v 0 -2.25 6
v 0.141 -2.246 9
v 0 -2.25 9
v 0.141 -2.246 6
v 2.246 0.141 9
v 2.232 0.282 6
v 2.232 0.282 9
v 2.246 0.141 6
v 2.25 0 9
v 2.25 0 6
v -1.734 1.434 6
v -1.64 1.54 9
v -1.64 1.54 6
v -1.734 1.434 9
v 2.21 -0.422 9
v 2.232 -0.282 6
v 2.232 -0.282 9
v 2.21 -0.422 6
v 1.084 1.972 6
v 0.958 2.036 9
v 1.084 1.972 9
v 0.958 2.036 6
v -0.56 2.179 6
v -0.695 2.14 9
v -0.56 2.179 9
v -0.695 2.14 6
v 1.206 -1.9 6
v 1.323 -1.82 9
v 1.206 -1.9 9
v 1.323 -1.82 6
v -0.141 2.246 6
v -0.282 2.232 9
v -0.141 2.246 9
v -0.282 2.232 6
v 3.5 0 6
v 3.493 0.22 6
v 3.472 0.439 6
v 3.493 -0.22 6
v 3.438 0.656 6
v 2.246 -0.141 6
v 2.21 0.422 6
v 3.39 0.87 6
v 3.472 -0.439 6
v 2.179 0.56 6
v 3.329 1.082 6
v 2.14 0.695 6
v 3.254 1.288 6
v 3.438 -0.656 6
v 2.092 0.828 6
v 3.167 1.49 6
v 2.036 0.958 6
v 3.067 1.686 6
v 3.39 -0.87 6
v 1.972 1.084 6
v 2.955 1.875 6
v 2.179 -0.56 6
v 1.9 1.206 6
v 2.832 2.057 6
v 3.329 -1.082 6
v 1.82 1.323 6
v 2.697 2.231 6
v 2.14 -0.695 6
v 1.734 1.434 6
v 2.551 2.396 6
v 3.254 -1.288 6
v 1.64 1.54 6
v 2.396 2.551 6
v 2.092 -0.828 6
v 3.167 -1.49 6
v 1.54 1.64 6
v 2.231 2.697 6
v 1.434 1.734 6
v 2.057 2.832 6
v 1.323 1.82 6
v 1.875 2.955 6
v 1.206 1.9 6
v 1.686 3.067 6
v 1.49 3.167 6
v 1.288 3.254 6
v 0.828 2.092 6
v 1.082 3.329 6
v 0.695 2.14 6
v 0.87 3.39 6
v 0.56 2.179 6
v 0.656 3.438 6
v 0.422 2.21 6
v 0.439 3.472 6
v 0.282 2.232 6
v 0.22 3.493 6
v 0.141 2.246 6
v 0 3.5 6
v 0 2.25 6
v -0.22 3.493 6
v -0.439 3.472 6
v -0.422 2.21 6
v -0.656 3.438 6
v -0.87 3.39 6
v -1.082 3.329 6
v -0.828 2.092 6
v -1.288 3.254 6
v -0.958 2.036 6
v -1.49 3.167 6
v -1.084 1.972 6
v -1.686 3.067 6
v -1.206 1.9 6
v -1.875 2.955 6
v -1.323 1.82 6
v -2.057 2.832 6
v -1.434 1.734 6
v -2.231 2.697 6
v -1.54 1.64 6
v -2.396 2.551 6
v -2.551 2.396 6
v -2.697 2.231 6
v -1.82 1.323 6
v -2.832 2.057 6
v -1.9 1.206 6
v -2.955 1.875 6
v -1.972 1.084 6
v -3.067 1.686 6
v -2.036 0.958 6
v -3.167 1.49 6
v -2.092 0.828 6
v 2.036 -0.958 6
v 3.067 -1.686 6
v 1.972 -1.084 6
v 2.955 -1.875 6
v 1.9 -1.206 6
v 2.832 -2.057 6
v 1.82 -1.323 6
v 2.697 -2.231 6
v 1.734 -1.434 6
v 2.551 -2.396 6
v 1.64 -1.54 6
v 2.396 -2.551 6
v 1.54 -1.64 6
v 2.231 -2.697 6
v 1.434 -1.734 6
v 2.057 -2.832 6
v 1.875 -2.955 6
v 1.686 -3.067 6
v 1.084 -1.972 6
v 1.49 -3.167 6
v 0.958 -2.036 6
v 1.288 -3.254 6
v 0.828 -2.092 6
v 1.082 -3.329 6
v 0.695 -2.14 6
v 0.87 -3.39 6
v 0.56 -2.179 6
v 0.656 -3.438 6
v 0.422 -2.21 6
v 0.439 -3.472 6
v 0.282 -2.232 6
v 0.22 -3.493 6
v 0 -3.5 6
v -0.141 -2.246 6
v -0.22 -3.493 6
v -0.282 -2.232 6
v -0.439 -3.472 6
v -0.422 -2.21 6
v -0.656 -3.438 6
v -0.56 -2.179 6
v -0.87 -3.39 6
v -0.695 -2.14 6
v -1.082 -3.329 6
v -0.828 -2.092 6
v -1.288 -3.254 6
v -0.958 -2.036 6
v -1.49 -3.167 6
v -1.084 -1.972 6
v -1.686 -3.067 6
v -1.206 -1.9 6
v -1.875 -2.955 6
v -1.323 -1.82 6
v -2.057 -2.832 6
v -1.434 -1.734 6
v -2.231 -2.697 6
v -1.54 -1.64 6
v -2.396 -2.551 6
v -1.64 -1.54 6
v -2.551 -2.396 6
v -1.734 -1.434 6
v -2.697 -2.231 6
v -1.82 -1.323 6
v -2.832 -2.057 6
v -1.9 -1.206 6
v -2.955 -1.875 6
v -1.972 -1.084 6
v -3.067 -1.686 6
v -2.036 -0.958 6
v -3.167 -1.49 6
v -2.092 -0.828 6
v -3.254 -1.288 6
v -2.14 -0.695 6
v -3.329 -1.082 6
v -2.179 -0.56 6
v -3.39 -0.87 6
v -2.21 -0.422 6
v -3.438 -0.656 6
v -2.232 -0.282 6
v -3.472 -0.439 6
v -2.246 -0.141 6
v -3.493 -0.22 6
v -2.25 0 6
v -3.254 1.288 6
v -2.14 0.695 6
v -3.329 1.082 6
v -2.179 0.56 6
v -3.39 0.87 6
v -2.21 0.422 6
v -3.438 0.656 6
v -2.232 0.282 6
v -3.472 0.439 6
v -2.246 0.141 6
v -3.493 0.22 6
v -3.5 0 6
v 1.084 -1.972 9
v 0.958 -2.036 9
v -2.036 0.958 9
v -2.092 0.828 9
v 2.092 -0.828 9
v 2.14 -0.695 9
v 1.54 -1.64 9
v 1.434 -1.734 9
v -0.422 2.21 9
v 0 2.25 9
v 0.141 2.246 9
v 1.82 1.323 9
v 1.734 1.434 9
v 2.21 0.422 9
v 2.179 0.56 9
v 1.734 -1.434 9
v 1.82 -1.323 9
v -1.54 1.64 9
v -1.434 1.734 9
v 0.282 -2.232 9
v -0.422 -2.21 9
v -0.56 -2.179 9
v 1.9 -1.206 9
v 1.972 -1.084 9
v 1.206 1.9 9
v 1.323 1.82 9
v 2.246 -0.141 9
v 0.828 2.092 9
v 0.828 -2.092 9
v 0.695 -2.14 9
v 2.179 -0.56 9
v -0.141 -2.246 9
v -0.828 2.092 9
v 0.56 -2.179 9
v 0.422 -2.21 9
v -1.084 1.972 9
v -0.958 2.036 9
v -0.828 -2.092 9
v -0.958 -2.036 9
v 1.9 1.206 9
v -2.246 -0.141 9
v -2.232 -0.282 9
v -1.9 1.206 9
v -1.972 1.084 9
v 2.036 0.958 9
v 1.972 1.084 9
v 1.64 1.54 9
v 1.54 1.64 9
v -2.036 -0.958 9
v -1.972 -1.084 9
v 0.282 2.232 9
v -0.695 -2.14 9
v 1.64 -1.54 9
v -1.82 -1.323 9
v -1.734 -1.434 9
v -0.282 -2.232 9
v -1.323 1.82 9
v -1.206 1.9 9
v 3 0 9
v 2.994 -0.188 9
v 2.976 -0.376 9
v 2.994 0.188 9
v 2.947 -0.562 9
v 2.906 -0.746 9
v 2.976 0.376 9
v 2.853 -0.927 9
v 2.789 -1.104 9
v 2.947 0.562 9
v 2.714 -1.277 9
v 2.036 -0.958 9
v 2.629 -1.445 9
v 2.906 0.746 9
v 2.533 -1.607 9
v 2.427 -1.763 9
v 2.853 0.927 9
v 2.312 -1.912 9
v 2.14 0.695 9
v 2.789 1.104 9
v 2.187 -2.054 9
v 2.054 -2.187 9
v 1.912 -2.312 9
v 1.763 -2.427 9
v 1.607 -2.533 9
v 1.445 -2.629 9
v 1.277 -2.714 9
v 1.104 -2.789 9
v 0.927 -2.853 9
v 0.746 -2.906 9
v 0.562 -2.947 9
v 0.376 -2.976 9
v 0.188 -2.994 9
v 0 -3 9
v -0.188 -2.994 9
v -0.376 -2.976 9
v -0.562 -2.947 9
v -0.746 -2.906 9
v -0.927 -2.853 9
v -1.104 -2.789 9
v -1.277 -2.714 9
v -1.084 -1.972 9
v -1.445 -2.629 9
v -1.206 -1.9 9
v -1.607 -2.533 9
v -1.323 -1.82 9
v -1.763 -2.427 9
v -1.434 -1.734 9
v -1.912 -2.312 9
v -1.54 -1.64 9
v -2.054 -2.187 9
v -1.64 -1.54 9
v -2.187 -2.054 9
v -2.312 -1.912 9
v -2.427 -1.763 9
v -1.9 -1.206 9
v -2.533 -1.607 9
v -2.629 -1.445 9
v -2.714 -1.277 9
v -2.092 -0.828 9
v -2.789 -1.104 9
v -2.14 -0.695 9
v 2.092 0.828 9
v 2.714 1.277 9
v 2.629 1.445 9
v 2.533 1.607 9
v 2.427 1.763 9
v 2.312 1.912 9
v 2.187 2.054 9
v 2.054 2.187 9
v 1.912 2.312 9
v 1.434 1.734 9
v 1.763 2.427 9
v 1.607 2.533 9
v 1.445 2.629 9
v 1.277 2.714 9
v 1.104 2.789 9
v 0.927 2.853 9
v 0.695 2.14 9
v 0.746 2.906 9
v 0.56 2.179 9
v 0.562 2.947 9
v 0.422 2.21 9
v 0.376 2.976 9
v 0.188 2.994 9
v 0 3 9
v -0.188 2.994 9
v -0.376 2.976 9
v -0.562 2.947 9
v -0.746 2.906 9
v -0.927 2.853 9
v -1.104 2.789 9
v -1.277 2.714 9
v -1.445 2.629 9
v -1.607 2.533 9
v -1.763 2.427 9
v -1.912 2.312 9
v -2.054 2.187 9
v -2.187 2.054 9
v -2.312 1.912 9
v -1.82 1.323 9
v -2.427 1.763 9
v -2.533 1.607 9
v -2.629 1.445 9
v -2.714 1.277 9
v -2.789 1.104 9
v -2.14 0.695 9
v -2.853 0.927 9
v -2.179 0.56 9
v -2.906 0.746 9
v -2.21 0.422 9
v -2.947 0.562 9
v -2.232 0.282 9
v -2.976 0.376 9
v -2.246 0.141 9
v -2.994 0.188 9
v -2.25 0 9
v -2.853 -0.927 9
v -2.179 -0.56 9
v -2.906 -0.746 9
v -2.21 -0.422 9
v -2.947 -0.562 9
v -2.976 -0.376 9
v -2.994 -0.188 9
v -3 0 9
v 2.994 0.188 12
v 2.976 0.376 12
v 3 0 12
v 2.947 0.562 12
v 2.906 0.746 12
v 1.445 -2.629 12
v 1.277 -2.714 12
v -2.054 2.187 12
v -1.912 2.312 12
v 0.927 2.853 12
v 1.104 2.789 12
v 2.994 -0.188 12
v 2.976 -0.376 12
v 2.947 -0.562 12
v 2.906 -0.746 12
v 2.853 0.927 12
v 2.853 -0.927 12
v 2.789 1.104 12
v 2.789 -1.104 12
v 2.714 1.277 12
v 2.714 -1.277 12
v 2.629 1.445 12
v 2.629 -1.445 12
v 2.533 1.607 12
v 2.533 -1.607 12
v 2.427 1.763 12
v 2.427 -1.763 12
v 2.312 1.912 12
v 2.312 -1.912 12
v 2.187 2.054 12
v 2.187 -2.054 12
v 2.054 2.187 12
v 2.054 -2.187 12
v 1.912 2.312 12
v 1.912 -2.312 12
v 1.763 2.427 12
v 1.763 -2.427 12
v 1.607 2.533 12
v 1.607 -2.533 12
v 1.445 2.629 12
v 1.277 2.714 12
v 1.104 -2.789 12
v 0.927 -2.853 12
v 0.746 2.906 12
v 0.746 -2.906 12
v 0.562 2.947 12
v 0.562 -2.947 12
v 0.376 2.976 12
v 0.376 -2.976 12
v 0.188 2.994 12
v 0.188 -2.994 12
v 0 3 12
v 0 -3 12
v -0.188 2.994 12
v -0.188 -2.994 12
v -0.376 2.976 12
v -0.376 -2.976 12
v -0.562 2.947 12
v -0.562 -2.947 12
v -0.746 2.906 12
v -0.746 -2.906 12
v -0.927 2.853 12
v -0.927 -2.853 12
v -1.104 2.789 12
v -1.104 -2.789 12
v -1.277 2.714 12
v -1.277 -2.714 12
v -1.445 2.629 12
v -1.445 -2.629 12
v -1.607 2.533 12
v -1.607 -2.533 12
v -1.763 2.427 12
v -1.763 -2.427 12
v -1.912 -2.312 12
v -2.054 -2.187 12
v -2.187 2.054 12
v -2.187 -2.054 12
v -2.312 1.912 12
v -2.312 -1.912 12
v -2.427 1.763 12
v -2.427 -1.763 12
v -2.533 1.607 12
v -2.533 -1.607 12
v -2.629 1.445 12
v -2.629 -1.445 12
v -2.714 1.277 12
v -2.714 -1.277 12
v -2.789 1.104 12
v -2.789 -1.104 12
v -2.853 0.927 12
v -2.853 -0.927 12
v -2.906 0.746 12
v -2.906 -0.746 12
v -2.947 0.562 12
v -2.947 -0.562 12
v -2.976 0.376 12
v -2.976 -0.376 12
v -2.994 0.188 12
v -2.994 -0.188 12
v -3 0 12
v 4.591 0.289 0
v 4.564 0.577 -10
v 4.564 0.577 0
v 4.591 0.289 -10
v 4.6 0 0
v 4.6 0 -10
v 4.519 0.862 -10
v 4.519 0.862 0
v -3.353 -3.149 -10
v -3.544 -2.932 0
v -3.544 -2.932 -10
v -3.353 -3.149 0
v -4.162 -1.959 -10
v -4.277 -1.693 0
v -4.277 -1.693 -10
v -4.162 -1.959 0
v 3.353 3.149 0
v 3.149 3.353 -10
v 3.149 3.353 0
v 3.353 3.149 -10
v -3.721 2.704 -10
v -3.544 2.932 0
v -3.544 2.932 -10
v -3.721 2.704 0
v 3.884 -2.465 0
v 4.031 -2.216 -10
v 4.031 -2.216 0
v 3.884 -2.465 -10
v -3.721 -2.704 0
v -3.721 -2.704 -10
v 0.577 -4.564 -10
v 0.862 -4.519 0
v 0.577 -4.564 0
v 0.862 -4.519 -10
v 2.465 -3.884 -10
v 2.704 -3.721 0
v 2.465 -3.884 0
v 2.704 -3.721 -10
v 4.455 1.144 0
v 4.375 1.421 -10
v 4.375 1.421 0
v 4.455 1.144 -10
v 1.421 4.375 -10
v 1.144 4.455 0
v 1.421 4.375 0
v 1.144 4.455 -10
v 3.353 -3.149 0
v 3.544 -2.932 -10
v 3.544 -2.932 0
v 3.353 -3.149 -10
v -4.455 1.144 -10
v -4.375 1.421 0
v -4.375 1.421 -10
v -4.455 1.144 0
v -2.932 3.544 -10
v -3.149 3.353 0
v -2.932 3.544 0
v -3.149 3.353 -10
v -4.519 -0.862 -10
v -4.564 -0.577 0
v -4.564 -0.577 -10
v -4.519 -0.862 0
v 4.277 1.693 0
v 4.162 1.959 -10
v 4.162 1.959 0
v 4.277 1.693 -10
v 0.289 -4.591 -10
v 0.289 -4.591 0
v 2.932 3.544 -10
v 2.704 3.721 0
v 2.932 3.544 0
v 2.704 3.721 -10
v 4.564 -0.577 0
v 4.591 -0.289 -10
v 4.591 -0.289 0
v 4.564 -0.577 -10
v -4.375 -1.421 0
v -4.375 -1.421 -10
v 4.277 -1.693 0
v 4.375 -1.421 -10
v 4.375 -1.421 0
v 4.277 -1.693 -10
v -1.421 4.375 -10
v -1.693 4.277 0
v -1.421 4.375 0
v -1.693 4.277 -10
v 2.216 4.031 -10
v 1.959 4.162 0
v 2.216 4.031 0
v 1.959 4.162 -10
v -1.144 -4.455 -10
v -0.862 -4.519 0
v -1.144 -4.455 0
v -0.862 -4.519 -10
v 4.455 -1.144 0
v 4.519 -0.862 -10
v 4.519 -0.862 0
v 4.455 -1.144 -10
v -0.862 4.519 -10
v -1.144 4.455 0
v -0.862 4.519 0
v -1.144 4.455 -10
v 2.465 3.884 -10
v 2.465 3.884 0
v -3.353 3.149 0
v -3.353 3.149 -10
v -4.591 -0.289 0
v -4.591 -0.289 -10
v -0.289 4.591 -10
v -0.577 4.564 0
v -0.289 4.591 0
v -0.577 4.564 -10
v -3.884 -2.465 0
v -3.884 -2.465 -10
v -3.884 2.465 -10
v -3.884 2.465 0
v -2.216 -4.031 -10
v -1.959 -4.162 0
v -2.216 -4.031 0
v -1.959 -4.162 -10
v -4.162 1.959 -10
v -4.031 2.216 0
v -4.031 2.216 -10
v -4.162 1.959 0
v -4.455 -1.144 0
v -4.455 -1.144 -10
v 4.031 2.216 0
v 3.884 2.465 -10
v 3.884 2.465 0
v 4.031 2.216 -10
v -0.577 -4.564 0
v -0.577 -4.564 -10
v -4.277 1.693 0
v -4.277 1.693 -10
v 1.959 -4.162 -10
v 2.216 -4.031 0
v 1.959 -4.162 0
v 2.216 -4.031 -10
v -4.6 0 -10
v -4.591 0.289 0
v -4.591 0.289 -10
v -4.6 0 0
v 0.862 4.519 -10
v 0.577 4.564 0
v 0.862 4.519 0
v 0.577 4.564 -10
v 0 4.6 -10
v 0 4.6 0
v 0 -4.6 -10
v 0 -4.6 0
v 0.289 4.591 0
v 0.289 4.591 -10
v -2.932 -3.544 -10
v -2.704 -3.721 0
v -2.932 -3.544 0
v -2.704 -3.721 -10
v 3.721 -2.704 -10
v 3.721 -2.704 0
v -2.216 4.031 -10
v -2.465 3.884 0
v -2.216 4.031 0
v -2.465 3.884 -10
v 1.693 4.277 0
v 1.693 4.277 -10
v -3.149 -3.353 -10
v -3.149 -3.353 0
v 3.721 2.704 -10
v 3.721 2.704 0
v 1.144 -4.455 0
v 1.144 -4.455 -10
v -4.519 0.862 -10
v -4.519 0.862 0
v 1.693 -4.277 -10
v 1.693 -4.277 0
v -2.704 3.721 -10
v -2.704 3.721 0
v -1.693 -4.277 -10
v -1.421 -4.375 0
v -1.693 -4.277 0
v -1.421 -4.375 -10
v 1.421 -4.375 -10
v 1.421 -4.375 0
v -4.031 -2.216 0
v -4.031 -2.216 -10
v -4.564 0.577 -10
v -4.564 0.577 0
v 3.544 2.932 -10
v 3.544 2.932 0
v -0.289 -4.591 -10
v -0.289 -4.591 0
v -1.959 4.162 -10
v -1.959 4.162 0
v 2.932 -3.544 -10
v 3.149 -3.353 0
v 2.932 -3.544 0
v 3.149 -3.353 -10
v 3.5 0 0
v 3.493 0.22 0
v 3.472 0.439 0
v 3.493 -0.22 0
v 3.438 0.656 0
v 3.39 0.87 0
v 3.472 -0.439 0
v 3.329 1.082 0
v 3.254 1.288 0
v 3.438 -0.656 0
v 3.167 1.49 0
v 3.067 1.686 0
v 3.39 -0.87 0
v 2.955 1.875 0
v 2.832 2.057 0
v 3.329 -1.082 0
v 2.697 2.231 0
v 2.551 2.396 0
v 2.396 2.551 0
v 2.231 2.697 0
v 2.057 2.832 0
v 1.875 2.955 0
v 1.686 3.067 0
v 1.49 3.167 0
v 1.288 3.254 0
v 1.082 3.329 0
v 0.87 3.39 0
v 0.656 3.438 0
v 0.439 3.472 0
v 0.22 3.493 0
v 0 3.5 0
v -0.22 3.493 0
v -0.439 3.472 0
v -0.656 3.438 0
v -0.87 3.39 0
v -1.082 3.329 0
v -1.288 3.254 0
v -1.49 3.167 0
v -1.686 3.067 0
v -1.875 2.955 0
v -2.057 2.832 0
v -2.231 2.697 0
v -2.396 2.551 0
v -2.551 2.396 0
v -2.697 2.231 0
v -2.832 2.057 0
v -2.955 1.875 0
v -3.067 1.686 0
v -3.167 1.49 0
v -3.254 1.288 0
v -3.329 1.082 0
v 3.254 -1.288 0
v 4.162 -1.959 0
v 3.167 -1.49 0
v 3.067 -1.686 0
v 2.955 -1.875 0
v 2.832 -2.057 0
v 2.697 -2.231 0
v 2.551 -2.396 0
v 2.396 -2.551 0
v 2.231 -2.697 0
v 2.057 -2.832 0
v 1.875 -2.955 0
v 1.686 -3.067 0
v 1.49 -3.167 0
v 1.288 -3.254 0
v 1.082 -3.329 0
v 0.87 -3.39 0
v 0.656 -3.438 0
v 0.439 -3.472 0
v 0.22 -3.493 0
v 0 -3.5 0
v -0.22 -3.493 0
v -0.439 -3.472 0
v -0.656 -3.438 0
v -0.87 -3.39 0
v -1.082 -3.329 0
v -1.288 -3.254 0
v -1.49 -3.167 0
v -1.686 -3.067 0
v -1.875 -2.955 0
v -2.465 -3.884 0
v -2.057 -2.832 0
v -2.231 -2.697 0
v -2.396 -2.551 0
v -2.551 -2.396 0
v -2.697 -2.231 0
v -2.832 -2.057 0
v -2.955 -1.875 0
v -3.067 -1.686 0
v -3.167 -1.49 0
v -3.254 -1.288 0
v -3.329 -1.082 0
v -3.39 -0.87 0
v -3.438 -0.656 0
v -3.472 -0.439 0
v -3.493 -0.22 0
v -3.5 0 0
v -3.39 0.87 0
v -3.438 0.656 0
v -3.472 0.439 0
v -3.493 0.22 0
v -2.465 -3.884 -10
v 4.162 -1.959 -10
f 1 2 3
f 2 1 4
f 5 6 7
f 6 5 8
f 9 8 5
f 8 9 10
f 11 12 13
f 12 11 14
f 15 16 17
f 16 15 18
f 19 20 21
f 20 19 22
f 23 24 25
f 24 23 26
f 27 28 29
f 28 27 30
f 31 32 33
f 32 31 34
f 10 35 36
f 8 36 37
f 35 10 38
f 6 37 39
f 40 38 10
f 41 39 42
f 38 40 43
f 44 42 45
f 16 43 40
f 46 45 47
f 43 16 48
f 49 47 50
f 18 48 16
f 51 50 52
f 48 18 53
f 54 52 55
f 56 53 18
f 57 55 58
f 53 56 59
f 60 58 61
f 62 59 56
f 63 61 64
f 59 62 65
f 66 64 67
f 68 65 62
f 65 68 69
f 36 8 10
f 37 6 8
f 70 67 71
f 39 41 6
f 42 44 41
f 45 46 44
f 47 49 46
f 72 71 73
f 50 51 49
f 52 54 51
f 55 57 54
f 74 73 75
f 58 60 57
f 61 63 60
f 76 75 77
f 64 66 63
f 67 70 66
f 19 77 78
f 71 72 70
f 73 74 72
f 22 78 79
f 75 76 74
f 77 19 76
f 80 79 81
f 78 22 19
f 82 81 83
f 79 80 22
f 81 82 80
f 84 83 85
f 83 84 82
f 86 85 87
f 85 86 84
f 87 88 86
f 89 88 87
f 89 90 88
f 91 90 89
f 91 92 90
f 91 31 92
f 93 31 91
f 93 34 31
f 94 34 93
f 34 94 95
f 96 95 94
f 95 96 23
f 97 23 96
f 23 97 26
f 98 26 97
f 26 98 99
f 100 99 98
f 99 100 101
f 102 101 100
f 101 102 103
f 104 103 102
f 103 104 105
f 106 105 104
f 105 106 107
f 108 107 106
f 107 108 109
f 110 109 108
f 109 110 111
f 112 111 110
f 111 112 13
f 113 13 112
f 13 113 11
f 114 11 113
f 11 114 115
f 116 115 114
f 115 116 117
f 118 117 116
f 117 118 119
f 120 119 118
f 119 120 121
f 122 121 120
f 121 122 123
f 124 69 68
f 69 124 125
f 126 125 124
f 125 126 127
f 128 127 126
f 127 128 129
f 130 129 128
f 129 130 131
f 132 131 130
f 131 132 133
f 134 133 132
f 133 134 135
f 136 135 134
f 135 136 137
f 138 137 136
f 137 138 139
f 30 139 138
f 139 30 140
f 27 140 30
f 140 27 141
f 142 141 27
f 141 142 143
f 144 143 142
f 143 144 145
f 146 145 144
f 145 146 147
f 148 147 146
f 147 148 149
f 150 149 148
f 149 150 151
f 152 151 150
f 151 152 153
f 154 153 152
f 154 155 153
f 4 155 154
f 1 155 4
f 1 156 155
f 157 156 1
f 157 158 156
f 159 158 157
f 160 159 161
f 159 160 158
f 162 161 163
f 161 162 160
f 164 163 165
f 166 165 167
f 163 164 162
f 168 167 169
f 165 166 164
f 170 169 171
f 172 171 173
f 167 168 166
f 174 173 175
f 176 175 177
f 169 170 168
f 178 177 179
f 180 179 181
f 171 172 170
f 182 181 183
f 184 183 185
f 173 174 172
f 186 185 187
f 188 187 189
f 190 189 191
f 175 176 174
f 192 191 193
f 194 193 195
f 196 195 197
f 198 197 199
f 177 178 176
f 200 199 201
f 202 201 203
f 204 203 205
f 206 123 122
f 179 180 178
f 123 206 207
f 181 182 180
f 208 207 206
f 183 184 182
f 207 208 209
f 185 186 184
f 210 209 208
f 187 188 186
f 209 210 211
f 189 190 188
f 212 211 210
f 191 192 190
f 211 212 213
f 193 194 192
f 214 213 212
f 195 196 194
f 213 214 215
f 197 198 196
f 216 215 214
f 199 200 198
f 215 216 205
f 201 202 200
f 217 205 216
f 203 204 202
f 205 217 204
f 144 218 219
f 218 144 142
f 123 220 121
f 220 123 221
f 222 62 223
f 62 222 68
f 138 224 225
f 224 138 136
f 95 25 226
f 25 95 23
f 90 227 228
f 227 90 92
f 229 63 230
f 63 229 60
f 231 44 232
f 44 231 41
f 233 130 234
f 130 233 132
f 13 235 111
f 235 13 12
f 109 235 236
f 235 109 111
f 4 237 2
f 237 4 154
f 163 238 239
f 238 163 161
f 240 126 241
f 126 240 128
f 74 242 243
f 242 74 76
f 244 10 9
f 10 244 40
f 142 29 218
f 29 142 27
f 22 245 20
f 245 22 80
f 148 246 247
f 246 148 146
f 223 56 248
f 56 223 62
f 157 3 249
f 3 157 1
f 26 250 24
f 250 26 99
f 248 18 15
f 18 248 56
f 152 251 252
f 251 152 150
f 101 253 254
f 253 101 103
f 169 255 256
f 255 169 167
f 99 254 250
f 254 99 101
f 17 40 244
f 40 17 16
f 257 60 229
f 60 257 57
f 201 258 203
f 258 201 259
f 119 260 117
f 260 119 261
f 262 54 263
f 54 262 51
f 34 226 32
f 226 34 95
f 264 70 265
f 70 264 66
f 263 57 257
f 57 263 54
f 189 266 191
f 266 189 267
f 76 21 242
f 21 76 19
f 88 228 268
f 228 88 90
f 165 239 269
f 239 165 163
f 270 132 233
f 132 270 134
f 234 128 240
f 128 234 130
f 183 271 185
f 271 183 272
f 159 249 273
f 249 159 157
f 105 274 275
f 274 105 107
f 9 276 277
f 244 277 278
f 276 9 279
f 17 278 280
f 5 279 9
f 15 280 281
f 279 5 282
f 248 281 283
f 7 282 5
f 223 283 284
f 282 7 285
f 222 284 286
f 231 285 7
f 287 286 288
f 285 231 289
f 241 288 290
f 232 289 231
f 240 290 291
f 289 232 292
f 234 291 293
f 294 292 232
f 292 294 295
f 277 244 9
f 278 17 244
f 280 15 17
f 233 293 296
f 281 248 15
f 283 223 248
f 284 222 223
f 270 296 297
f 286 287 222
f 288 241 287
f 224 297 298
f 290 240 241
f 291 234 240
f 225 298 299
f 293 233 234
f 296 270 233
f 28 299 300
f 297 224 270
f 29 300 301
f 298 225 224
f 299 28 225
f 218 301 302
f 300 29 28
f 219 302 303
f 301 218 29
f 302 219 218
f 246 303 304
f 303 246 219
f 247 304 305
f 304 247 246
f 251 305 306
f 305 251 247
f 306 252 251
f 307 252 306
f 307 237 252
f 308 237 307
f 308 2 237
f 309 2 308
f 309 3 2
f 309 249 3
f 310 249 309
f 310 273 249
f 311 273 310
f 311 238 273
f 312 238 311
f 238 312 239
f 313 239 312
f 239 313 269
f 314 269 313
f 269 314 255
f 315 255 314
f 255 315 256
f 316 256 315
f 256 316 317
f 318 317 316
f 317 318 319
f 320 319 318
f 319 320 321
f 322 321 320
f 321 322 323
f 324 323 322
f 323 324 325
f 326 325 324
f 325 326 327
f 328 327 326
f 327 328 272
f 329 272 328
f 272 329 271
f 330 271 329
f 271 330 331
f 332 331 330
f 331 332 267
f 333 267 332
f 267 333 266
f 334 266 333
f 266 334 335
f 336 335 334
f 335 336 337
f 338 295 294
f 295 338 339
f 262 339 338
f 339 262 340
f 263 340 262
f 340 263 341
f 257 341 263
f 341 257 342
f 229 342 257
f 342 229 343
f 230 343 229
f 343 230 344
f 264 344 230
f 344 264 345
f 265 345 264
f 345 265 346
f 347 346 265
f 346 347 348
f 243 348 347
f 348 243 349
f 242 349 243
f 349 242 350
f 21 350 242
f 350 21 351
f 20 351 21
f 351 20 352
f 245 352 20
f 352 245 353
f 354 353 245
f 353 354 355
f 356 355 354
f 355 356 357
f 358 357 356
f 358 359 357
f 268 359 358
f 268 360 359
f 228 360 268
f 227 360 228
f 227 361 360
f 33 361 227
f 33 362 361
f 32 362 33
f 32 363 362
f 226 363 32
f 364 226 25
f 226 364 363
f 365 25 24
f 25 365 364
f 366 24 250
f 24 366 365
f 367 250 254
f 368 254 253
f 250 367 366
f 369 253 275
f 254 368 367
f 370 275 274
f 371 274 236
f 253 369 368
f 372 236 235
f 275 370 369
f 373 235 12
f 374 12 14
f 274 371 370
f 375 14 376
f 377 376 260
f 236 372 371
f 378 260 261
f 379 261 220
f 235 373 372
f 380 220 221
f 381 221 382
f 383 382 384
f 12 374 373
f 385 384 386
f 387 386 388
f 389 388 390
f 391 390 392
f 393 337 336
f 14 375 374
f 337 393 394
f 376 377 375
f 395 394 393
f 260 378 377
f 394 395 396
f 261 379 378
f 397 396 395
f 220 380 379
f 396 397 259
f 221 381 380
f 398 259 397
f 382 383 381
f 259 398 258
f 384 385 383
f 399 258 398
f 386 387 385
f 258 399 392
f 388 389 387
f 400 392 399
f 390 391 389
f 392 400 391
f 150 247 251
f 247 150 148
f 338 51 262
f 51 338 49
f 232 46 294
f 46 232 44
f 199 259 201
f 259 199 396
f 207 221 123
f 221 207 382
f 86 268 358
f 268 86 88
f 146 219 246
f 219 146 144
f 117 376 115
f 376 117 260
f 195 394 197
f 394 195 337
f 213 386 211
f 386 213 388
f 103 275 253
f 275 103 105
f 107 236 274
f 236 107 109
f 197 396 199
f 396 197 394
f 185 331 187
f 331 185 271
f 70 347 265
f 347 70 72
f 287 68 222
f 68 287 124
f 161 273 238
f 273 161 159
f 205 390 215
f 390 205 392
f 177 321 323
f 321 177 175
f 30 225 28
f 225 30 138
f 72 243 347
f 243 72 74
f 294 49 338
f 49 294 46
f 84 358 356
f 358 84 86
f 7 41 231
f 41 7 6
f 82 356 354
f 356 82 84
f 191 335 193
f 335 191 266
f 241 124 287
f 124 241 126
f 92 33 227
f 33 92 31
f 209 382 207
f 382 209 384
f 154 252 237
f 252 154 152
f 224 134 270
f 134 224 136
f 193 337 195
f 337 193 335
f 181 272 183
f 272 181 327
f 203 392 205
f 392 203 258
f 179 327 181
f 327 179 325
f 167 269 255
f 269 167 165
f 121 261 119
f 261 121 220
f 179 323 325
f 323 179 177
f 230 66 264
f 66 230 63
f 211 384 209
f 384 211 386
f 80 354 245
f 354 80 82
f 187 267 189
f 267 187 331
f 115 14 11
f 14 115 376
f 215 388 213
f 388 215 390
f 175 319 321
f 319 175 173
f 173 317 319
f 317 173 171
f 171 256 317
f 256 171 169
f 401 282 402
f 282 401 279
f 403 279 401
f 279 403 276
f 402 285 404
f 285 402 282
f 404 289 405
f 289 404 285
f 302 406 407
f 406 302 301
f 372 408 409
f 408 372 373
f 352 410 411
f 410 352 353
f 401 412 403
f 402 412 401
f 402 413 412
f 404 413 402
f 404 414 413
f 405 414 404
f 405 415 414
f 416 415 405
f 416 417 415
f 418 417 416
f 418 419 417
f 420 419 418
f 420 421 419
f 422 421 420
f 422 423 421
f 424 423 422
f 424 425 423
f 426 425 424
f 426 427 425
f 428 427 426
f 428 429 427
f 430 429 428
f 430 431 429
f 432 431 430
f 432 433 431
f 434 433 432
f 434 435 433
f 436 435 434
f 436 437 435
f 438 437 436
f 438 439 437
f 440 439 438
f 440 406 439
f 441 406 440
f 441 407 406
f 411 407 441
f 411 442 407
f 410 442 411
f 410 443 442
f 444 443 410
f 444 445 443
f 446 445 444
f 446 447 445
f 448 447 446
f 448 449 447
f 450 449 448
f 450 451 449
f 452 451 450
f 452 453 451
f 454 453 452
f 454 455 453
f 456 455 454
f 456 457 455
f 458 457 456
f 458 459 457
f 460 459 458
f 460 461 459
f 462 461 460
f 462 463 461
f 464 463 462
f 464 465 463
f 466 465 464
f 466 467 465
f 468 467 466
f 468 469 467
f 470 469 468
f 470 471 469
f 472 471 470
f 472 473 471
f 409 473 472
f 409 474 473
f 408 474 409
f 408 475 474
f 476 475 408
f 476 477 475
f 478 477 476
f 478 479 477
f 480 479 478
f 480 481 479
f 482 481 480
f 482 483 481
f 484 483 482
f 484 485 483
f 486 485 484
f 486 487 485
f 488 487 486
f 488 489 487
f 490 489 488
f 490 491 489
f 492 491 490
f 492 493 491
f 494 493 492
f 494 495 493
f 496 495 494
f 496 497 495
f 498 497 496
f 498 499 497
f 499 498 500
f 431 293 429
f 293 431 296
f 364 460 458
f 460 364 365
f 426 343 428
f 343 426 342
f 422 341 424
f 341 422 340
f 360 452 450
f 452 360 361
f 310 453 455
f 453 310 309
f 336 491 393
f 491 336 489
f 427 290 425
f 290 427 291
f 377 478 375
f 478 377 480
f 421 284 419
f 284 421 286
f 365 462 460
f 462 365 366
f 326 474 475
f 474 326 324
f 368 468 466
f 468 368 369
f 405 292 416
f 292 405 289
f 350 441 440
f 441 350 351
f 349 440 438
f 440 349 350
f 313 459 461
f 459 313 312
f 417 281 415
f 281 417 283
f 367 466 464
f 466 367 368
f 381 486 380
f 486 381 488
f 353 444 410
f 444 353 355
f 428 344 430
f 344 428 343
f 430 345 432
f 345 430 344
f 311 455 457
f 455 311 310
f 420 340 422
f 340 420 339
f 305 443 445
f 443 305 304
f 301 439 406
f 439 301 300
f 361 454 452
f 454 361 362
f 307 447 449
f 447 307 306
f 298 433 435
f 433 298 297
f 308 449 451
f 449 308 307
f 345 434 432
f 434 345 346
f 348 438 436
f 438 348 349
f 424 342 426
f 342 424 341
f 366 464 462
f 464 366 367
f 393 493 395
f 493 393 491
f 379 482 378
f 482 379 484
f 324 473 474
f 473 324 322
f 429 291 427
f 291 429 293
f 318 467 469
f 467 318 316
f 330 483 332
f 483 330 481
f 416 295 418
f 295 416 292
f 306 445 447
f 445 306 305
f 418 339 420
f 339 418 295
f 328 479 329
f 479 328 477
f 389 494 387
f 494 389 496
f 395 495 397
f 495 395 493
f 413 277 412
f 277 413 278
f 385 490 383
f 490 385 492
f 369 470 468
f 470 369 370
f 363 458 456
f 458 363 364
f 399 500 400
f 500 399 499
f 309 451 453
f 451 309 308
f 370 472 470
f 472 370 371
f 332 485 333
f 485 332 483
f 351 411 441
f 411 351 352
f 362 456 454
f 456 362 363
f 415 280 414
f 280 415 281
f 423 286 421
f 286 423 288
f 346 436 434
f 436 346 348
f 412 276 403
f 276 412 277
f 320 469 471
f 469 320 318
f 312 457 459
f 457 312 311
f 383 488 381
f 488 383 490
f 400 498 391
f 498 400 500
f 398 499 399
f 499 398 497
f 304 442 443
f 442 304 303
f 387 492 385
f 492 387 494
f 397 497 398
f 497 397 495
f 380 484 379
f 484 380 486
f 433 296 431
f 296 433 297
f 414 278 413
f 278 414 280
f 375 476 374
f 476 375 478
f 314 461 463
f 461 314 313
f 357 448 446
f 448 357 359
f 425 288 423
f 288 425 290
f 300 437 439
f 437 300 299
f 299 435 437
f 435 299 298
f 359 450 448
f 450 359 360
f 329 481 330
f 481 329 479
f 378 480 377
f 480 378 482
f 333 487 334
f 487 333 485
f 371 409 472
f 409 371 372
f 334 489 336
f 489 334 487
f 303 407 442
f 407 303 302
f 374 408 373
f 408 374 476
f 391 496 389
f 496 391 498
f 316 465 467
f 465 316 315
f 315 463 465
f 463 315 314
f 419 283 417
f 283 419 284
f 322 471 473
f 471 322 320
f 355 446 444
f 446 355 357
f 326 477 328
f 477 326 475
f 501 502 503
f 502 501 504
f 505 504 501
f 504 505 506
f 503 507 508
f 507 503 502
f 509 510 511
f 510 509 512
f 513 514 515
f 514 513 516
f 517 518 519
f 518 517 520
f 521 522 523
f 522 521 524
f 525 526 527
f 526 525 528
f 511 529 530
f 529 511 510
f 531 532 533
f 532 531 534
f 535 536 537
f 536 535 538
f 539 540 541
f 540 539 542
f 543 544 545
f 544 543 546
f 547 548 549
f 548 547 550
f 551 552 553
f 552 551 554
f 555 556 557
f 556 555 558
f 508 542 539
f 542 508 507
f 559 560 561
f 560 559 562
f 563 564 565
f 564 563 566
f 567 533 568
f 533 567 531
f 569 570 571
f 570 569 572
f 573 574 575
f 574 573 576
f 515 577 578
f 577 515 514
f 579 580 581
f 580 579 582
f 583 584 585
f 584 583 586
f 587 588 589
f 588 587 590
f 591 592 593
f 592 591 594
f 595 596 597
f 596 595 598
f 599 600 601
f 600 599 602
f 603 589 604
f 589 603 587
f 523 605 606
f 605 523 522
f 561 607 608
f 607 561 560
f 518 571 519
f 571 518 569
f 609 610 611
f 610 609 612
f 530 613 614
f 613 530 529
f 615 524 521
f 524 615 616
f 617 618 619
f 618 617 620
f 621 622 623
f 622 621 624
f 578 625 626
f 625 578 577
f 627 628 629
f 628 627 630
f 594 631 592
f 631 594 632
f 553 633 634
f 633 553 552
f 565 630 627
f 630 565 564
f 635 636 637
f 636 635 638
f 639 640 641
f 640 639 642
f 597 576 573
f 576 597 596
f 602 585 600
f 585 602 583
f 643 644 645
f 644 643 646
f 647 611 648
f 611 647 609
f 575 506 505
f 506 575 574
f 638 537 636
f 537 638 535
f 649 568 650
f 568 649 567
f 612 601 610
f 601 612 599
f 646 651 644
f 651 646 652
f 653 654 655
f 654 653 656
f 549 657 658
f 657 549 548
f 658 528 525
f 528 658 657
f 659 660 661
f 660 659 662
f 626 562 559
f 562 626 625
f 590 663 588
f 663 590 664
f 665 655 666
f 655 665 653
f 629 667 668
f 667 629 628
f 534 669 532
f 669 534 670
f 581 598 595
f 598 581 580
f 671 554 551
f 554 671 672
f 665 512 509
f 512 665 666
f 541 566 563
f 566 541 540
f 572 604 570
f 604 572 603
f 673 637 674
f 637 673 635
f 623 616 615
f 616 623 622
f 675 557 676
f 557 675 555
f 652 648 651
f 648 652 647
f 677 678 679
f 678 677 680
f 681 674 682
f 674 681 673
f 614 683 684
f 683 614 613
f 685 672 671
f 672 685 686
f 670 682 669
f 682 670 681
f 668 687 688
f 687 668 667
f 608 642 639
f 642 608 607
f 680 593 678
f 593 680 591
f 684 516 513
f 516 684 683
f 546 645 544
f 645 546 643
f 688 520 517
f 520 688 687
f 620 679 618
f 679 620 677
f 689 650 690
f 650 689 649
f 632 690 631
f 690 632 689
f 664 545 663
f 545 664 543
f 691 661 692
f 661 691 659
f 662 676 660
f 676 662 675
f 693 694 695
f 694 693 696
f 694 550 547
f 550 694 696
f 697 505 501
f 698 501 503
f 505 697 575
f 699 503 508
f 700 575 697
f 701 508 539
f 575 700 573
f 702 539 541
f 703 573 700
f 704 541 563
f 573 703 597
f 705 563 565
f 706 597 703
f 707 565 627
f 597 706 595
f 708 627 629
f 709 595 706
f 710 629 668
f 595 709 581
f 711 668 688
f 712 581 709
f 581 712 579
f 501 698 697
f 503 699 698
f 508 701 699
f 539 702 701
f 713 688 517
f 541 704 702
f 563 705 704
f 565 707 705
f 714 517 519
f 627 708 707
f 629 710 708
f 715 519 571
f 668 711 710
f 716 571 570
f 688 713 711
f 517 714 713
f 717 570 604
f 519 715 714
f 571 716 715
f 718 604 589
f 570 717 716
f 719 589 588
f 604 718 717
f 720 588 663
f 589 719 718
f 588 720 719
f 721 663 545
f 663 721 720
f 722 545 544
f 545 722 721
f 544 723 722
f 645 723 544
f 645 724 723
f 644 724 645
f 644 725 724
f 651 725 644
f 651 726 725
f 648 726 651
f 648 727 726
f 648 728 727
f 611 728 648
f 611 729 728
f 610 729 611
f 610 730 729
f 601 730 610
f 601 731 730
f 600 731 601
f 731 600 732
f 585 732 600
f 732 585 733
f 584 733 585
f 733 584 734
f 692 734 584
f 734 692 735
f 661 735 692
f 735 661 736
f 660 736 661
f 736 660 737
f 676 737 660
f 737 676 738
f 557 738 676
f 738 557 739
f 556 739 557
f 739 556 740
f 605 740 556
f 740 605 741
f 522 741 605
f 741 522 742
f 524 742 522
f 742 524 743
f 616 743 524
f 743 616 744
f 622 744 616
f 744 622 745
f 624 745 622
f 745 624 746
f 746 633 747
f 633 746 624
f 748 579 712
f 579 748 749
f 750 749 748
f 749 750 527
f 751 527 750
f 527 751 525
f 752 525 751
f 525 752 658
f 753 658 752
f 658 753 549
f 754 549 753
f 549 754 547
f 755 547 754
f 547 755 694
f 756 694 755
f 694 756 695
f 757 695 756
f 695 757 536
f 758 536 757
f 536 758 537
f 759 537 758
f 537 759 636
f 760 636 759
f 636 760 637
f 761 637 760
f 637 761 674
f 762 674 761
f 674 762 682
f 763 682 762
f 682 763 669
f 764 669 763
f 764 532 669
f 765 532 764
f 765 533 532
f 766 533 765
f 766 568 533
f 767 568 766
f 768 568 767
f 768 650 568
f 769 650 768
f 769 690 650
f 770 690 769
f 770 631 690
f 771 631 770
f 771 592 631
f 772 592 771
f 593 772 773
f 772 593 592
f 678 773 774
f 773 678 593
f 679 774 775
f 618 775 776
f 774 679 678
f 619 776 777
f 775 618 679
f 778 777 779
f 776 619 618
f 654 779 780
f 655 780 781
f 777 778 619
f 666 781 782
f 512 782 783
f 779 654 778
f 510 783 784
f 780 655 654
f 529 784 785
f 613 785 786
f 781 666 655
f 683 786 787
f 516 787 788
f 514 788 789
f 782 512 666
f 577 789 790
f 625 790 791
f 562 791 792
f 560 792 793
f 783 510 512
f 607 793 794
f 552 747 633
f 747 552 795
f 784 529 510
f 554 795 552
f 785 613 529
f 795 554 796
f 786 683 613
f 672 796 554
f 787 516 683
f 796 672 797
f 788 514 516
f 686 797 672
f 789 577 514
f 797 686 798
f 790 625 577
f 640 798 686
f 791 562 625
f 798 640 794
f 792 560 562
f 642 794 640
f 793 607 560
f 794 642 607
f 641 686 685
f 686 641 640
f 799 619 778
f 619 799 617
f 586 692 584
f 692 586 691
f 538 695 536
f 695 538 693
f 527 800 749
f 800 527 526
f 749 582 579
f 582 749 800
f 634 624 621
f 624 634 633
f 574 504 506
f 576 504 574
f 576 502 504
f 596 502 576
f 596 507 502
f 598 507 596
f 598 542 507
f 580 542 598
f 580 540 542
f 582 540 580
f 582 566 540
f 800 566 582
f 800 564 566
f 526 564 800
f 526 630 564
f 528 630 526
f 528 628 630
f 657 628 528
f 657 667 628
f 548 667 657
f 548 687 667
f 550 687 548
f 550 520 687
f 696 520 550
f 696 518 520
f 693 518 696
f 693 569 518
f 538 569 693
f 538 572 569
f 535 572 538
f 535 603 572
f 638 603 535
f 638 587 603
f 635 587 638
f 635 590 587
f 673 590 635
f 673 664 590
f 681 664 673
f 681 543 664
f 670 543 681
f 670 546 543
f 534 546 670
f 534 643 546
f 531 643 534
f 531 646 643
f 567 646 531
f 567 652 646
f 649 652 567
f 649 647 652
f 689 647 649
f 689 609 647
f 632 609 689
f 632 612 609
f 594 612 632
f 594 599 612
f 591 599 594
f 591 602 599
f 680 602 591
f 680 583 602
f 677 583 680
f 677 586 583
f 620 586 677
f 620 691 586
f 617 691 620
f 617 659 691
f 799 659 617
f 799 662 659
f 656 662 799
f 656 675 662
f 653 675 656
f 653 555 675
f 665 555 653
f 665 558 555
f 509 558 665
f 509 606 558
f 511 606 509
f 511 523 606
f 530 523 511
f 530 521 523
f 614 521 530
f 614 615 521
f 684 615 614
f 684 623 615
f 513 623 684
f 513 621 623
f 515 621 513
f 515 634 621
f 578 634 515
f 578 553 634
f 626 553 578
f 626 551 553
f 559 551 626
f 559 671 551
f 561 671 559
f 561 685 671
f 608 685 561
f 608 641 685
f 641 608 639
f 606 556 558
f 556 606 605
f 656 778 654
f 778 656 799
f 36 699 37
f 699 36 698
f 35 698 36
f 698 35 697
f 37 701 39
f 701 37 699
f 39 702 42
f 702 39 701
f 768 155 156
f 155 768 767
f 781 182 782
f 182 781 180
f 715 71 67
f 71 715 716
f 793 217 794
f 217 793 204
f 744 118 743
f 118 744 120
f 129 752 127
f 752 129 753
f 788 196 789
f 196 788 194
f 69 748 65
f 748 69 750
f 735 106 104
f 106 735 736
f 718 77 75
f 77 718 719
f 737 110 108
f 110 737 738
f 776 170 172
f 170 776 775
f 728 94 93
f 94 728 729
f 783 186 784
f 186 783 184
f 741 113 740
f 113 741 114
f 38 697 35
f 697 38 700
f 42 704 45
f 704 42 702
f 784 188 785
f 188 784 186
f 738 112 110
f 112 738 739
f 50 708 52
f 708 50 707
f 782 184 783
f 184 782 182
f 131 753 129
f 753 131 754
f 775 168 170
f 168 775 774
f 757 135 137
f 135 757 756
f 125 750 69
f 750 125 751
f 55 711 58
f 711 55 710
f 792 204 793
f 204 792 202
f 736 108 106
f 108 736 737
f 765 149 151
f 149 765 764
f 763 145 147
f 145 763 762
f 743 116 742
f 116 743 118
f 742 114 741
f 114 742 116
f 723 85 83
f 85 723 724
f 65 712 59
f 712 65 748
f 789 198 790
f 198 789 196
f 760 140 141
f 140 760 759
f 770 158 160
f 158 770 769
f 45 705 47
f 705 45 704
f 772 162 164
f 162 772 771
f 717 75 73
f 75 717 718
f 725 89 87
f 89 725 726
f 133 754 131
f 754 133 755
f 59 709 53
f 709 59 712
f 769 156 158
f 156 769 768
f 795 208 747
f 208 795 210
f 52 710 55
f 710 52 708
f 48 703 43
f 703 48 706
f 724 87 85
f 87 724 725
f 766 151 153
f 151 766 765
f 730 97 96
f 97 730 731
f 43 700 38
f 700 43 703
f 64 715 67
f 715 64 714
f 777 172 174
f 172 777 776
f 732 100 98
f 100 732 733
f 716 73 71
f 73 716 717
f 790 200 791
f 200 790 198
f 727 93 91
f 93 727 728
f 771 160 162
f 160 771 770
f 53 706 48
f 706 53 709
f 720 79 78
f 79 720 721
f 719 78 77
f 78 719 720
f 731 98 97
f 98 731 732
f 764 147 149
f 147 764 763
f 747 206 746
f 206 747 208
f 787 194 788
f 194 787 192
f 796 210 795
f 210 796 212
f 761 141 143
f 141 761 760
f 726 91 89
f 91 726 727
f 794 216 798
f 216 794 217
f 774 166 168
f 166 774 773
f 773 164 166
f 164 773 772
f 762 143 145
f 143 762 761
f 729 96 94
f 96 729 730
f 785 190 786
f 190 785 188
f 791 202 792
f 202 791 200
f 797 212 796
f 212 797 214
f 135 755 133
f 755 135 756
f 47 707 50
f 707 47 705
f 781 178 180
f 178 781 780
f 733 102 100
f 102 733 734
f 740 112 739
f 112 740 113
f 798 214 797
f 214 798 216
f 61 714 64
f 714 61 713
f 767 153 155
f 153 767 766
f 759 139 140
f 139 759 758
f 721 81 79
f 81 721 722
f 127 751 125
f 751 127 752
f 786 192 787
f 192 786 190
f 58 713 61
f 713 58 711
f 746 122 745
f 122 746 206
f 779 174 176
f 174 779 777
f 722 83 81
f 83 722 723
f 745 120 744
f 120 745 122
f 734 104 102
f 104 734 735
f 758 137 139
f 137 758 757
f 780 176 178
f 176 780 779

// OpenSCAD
// file: ../push-switches.scad
ps10_mounting_thread_d = 7;
ps10_mounting_thread_h = 6;
ps10_raster = 4.3;
ps10_corpus_d = 9.2;
ps10_corpus_h = 10;

ps10_button_leg_h = 3;
ps10_button_leg_d = 4.5; // GUESTIMATE
ps10_button_h = 3;
ps10_button_d = 6;

module ps10_push_switch() {
  translate([0, 0, -ps10_corpus_h])
    cylinder(d = ps10_corpus_d, h = ps10_corpus_h);

  cylinder(d = ps10_mounting_thread_d, h = ps10_mounting_thread_h);

  translate([0, 0, ps10_mounting_thread_h]) {
    cylinder(d = ps10_button_leg_d, h = ps10_button_leg_h);

    translate([0, 0, ps10_button_leg_h])
      cylinder(d = ps10_button_d, h = ps10_button_h);
  }
}
// main file
use <../push-switches.scad>;
$fn = 100;
ps10_push_switch();
